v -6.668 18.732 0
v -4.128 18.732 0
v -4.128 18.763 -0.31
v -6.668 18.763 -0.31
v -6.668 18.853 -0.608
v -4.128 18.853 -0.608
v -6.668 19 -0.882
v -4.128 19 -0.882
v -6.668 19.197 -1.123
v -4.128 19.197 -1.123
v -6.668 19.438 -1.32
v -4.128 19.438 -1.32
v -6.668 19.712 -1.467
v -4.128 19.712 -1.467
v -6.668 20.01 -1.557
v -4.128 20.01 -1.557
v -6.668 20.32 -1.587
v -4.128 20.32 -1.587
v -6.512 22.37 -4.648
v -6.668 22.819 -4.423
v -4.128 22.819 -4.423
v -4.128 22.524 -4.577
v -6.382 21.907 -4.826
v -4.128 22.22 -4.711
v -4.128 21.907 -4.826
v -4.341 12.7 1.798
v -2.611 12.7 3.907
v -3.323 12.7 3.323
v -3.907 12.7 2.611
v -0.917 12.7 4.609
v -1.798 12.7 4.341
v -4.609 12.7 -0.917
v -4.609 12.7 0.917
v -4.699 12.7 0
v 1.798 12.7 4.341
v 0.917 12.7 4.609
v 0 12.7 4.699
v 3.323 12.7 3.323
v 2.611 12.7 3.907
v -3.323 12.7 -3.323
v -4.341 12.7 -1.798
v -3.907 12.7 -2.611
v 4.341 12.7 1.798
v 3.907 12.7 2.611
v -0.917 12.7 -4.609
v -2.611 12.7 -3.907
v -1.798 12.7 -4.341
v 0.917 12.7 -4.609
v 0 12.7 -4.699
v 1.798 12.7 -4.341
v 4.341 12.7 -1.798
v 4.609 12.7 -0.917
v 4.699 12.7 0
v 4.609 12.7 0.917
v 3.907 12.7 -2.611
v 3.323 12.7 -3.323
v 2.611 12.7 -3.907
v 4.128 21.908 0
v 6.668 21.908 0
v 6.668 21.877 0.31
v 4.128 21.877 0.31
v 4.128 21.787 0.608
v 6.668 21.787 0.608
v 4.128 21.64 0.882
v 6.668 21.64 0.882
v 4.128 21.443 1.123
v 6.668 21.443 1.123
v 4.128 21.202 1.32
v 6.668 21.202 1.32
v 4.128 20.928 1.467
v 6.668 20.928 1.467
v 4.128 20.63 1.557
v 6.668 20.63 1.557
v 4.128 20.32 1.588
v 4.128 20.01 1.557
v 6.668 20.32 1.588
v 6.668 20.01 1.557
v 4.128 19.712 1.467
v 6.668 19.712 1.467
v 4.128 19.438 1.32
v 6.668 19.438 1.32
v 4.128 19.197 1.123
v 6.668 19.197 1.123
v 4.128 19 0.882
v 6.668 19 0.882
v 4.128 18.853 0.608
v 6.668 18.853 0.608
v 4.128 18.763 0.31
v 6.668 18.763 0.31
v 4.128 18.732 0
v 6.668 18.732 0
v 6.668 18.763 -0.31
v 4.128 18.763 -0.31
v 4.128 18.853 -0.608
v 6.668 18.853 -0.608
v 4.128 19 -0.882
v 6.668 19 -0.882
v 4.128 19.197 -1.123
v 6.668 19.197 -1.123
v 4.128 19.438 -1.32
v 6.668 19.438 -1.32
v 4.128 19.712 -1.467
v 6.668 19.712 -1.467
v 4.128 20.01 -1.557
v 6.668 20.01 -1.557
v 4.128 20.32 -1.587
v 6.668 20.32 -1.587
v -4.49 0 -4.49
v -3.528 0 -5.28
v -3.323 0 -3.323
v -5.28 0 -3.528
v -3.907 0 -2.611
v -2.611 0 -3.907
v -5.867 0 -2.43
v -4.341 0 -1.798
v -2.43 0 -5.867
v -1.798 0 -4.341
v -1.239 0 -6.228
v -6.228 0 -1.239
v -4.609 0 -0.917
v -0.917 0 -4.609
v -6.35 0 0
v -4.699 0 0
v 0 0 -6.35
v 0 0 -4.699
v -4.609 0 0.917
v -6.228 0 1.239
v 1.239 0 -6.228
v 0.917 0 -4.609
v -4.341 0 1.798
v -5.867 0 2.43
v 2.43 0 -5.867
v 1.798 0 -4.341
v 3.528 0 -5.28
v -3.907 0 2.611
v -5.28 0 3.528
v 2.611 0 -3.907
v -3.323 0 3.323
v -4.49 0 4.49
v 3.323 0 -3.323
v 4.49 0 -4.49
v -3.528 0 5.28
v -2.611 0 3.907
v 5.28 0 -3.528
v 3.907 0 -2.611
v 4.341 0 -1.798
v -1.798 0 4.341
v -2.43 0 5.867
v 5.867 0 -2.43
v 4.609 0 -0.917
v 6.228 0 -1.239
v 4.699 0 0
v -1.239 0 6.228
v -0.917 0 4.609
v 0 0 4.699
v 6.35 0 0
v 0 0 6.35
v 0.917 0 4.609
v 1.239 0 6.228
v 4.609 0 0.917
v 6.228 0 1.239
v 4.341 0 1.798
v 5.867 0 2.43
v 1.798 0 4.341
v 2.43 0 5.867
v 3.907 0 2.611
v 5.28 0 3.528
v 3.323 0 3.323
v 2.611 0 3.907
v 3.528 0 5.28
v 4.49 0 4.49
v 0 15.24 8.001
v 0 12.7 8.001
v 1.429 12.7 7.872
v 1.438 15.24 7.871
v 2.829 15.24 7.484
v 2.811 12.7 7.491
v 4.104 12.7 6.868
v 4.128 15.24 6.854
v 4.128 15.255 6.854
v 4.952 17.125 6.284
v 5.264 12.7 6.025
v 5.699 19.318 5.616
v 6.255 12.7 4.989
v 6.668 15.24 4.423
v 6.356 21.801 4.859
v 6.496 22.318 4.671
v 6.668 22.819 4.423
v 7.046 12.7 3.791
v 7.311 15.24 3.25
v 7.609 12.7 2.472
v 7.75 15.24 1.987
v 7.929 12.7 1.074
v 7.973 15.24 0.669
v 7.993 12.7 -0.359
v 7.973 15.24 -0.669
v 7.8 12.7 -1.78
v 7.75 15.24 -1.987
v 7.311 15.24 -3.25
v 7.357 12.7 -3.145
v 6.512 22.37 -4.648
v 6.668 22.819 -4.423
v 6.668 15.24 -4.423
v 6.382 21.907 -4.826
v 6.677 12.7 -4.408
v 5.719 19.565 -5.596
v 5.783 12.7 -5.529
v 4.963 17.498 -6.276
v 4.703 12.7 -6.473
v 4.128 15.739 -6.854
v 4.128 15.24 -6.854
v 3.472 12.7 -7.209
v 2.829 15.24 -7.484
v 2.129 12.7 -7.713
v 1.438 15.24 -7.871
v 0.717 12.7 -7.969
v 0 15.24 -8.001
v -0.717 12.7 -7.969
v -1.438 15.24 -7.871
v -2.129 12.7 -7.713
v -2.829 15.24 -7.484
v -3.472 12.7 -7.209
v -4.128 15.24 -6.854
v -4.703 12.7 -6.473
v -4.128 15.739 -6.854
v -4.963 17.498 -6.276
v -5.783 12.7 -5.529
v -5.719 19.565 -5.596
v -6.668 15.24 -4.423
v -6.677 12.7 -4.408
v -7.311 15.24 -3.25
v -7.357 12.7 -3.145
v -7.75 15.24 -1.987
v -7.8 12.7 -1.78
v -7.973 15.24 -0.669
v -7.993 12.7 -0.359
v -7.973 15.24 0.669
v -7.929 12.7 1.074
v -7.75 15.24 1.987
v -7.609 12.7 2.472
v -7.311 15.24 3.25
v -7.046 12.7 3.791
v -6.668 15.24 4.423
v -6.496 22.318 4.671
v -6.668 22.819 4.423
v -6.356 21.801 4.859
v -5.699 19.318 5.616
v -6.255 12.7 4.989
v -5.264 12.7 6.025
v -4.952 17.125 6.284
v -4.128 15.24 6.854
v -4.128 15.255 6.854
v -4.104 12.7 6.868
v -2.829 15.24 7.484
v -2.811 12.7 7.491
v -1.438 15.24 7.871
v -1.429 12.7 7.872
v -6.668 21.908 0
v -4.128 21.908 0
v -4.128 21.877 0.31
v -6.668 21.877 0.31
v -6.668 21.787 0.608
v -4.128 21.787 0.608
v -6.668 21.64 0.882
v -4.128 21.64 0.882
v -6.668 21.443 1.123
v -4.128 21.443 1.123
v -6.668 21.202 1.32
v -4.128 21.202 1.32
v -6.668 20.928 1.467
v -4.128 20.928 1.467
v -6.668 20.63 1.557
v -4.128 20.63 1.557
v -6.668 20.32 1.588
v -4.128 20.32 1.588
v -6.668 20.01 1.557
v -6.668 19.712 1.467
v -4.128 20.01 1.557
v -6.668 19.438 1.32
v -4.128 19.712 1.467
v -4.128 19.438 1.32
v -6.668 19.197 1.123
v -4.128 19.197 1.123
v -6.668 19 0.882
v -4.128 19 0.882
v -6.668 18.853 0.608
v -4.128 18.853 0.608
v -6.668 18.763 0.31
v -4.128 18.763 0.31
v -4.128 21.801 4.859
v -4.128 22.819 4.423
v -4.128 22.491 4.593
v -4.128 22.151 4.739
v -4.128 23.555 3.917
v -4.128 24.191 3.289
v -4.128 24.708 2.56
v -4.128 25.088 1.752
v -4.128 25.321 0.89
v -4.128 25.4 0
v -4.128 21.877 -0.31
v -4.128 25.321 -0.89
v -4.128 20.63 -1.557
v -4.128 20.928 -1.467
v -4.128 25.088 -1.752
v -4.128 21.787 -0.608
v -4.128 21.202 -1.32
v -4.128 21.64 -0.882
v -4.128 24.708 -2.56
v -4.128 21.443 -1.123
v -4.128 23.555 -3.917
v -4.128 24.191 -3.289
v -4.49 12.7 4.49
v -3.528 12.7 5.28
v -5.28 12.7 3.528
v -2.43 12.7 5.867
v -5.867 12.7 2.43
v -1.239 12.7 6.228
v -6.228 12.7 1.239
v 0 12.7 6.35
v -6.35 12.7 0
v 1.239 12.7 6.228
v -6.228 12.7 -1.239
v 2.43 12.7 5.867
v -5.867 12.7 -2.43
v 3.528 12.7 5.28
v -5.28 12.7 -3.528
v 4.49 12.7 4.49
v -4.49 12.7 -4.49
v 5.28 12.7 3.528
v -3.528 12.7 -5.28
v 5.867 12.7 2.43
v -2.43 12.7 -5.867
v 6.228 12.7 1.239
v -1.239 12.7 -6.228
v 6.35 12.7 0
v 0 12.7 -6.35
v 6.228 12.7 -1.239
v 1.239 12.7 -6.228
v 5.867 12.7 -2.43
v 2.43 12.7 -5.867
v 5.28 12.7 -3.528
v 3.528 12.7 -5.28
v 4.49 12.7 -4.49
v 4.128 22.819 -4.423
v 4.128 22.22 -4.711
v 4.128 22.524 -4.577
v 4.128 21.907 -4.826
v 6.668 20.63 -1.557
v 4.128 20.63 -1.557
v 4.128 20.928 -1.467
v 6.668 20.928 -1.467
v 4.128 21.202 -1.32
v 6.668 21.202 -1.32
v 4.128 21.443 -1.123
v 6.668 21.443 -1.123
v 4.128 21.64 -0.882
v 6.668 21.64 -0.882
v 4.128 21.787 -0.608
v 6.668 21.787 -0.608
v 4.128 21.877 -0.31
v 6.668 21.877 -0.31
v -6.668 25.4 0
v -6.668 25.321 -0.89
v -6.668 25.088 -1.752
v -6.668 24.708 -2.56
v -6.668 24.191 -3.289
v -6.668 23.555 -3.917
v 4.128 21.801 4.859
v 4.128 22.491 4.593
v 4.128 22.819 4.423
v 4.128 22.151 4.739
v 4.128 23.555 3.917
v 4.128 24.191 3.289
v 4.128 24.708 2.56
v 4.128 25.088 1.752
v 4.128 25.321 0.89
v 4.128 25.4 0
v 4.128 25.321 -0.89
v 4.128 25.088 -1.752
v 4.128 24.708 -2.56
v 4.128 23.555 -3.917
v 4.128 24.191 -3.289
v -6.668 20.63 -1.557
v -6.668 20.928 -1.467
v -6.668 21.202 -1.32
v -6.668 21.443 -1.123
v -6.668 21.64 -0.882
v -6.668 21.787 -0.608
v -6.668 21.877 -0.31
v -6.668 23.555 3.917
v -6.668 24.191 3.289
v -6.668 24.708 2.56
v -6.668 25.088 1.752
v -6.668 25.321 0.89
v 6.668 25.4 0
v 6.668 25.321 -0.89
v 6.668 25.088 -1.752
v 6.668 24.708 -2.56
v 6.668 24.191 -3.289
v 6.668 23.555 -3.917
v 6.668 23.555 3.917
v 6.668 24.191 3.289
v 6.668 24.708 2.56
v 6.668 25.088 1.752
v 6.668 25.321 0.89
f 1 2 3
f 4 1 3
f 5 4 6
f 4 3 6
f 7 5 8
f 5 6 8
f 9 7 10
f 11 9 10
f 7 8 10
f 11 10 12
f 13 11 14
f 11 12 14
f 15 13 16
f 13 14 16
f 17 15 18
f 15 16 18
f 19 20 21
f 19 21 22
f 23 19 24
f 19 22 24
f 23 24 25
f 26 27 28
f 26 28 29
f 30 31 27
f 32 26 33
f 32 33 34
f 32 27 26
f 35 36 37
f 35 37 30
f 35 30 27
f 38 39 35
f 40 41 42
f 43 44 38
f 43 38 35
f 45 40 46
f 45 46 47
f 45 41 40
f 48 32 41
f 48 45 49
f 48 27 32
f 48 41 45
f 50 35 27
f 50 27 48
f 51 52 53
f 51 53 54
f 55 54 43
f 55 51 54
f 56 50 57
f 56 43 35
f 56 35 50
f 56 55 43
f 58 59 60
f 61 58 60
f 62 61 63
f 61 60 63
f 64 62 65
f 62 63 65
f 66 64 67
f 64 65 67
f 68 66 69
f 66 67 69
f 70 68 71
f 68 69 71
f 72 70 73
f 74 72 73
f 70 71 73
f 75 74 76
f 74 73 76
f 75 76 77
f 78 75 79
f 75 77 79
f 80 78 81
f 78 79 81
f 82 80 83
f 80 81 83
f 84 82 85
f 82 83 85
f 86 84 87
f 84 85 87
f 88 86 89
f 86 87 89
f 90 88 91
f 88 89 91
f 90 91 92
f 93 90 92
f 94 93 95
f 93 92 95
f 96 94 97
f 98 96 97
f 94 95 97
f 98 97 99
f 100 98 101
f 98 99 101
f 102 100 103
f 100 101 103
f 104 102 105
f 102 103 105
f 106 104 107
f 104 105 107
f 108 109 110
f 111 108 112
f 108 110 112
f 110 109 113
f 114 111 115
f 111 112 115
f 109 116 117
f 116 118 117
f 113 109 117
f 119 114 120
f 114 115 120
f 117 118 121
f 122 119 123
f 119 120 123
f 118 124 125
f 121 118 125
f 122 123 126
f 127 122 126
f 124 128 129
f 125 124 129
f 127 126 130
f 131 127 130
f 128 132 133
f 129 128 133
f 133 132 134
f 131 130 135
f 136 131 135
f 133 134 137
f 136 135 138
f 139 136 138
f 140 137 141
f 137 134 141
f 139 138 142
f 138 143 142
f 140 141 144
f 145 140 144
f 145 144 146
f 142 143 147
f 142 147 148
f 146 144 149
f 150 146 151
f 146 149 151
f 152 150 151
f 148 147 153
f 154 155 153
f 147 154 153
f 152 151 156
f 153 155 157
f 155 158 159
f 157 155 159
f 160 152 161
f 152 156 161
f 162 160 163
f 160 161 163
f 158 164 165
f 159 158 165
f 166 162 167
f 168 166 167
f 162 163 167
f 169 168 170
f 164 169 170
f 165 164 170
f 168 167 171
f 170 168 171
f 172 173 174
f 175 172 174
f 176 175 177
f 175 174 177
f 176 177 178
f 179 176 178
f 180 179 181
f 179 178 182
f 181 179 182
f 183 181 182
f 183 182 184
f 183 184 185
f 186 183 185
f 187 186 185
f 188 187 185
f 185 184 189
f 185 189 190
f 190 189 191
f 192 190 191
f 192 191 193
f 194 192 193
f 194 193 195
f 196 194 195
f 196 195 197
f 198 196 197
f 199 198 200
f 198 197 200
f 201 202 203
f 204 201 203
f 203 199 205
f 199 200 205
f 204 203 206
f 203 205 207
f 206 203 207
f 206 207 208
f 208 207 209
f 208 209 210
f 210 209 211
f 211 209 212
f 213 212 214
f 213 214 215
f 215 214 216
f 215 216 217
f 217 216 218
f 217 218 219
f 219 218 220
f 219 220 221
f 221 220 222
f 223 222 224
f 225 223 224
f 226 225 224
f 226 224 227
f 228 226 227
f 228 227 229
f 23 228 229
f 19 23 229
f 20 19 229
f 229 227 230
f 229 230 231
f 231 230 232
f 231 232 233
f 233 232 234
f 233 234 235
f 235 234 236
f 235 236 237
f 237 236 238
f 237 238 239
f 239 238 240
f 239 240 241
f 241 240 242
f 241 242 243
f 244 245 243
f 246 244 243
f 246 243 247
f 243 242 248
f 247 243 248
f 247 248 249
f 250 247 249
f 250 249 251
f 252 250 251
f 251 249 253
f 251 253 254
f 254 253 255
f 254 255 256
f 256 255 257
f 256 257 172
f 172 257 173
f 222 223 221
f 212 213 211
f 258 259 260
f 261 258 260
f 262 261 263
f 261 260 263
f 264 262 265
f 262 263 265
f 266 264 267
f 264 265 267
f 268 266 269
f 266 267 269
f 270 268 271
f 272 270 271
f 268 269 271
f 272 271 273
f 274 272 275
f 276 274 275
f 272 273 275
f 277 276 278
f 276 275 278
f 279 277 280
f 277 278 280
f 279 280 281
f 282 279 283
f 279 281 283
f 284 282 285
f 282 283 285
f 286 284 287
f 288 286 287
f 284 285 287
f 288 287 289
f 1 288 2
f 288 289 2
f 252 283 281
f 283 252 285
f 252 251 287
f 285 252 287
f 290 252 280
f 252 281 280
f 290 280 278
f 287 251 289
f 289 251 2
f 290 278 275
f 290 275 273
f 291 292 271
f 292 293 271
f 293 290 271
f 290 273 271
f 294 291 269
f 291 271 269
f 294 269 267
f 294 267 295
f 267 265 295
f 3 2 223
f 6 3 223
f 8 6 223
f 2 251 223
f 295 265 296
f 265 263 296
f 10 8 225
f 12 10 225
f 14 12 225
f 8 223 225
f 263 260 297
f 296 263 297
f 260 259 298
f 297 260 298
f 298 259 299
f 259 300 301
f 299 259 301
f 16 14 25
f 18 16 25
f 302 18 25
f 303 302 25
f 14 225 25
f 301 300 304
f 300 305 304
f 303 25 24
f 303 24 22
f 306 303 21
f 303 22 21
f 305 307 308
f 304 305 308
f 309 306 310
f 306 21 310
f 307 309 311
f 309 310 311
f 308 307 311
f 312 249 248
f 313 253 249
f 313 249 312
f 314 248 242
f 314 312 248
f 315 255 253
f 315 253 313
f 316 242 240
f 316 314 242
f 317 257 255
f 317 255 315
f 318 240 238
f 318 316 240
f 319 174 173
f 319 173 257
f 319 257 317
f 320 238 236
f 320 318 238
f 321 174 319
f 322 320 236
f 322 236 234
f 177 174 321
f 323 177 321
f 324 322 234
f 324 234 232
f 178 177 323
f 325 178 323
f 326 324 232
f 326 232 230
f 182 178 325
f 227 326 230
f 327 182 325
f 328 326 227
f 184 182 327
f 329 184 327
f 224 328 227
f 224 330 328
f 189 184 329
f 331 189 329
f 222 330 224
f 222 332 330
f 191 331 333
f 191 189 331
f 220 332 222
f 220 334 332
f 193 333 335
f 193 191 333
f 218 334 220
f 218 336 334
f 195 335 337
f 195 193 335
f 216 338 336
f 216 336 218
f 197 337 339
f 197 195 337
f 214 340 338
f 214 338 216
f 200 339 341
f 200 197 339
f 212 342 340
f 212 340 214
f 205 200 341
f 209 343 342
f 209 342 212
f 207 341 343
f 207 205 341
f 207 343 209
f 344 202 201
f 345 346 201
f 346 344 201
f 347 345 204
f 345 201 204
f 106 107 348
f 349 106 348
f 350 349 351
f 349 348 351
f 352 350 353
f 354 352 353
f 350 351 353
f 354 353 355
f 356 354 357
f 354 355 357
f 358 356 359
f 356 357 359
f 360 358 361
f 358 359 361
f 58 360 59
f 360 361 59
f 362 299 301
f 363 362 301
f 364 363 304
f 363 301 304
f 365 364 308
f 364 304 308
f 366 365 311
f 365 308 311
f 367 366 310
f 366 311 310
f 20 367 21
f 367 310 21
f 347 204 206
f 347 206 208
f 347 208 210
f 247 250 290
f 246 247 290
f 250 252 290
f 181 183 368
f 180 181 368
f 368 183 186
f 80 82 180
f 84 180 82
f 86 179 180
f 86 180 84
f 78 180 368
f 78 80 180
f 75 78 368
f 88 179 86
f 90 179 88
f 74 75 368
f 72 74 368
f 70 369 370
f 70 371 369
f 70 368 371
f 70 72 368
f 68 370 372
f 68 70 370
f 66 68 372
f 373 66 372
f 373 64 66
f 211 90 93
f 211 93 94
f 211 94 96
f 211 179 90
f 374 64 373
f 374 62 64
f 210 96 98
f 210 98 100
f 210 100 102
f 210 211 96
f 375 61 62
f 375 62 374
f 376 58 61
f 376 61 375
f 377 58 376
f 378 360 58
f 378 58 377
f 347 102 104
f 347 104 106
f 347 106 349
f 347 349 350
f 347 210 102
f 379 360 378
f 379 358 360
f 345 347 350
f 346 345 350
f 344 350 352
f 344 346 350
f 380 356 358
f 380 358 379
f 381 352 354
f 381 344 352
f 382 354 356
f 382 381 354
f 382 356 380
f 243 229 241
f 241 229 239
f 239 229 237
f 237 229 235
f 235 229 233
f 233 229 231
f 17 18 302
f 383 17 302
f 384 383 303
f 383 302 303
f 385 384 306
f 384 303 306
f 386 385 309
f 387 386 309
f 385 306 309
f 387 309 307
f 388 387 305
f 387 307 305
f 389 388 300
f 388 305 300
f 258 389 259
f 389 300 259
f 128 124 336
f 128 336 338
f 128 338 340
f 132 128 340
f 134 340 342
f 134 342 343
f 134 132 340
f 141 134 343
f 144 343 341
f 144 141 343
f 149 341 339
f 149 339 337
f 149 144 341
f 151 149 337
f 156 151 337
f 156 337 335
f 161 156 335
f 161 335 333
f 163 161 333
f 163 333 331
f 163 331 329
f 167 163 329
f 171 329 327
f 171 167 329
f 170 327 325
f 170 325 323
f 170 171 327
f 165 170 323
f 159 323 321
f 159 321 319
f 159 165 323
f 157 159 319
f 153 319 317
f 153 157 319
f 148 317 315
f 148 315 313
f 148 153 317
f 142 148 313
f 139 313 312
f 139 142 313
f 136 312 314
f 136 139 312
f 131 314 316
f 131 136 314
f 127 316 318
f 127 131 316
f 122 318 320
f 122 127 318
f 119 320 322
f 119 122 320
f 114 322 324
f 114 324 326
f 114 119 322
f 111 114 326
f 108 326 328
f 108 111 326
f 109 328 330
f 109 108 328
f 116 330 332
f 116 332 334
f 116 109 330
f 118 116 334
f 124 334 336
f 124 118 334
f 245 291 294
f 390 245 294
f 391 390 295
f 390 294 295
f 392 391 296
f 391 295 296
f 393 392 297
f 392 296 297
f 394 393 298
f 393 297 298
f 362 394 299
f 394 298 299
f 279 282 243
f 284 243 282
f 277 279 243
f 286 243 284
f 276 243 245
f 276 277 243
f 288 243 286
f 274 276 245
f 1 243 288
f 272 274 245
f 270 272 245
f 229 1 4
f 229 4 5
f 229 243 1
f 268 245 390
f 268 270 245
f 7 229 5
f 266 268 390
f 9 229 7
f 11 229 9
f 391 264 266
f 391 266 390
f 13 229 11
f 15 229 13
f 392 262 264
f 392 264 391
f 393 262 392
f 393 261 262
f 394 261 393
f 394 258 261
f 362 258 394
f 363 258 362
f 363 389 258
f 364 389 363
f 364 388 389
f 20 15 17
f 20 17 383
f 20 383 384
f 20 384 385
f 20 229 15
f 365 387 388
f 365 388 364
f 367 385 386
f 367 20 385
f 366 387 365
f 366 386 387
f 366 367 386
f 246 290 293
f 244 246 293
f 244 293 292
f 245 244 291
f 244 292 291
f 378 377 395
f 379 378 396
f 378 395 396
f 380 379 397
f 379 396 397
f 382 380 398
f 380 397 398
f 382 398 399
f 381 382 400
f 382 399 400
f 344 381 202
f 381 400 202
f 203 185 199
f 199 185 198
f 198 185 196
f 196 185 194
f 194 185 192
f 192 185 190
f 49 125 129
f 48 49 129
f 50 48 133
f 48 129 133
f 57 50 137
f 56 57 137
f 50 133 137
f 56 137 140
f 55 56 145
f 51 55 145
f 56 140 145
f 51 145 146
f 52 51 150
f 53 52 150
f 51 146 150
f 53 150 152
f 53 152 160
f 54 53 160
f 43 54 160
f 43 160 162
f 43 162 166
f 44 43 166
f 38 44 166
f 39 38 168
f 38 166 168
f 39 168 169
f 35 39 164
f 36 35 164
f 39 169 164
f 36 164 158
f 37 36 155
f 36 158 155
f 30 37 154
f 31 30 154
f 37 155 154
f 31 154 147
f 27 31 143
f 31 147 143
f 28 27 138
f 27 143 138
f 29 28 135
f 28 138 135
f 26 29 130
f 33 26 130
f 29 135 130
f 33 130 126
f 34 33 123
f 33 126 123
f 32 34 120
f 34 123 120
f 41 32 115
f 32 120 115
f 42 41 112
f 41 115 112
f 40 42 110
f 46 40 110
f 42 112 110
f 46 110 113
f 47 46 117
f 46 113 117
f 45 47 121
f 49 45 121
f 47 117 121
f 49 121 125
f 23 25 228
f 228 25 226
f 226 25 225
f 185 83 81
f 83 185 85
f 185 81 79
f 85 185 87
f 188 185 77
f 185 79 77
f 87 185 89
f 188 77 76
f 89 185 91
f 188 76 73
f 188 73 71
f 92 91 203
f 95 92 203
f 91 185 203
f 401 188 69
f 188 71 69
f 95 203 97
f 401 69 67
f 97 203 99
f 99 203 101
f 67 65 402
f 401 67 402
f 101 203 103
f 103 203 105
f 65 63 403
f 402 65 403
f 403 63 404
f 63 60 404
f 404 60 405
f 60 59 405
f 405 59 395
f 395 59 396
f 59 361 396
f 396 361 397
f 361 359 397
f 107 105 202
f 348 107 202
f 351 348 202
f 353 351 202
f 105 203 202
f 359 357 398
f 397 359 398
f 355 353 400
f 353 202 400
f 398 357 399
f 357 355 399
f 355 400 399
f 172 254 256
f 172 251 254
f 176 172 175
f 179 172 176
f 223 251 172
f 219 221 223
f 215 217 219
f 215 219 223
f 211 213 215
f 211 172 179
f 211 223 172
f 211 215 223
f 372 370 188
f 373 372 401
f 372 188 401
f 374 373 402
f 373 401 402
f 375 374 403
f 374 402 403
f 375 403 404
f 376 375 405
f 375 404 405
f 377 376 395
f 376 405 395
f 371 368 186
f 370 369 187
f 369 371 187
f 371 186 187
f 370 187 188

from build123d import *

# Parameters (mm, degrees)
SKETCH1_R               = 8.001
BOSS_EXTRUDE1_DEPTH     = 25.4
SKETCH2_R               = 8.001
SKETCH2_R_2             = 6.35
SKETCH2_R_3             = 4.699
CUT_EXTRUDE1_DEPTH      = 12.7
CUT_EXTRUDE2_DEPTH      = 28.806330251
CUT_EXTRUDE2_DEPTH_BACK = 28.806330251
SKETCH3_W               = 8.255
SKETCH3_H               = 10.16
SKETCH3_W_2             = 1.3335
CUT_EXTRUDE3_DEPTH      = 31.402975072


with BuildPart() as part:
    # Sketch1 → Boss-Extrude1 (new body)
    with BuildSketch(Plane(origin=(0, 0, 0), x_dir=(1, 0, 0), z_dir=(0, 1, 0))):
        with Locations(Location((0, 0, 0), (0, 0, 270))):
            Circle(SKETCH1_R)
    extrude(amount=BOSS_EXTRUDE1_DEPTH)

    # Sketch2 → Cut-Extrude1 (cut)
    # profile 1 of 2: a face of its own
    with BuildSketch(Plane(origin=(0, 0, 0), x_dir=(-1, 0, 0), z_dir=(0, -1, 0))):
        with Locations(Location((0, 0, 0), (0, 0, 90))):
            Circle(SKETCH2_R)
        with Locations(Location((0, 0, 0), (0, 0, 90))):
            Circle(SKETCH2_R_2, mode=Mode.SUBTRACT)
    # profile 2 of 2: a face of its own
    with BuildSketch(Plane(origin=(0, 0, 0), x_dir=(-1, 0, 0), z_dir=(0, -1, 0))):
        with Locations(Location((0, 0, 0), (0, 0, 90))):
            Circle(SKETCH2_R_3)
    extrude(amount=-CUT_EXTRUDE1_DEPTH, mode=Mode.SUBTRACT)

    # Sketch3 → Cut-Extrude2 (cut, two sides: drawn at the far end of the back side and taken through both)
    with BuildSketch(Plane.XY.offset(-CUT_EXTRUDE2_DEPTH_BACK)):
        with Locations((0, 20.32)):
            Rectangle(SKETCH3_W, SKETCH3_H)
        with Locations((-7.33425, 20.32)):
            Rectangle(SKETCH3_W_2, SKETCH3_H)
        with Locations((7.33425, 20.32)):
            Rectangle(SKETCH3_W_2, SKETCH3_H)
    extrude(amount=CUT_EXTRUDE2_DEPTH + CUT_EXTRUDE2_DEPTH_BACK, mode=Mode.SUBTRACT)

    # Sketch4 → Cut-Extrude3 (cut, through all)
    with BuildSketch(Plane(origin=(6.6675, 0, 0), x_dir=(0, 0, -1), z_dir=(1, 0, 0))):
        with BuildLine():
            Line((-4.422719158, 25.4), (0, 25.4))
            Line((0, 25.4), (4.422719158, 25.4))
            Line((4.422719158, 25.4), (4.422719158, 22.819190919))
            ThreePointArc((4.422719158, 22.819190919), (4.646674927, 22.373000761), (4.825752455, 21.906982432))
            Line((4.825752455, 21.906982432), (7.018236237, 15.24))
            Line((7.018236237, 15.24), (6.955993892, 50.8))
            Line((6.955993892, 50.8), (-6.858660717, 50.8))
            Line((-6.858660717, 50.8), (-6.858660717, 15.24))
            Line((-6.858660717, 15.24), (-4.859385257, 21.800802121))
            ThreePointArc((-4.859385257, 21.800802121), (-4.668901855, 22.321937928), (-4.422719158, 22.819190919))
            Line((-4.422719158, 22.819190919), (-4.422719158, 25.4))
        make_face()
        with BuildLine():
            ThreePointArc((1.5875, 20.32), (1.122532015, 21.442532015), (0, 21.9075))
            Line((0, 21.9075), (0, 18.7325))
            ThreePointArc((0, 18.7325), (1.122532015, 19.197467985), (1.5875, 20.32))
        make_face()
        with BuildLine():
            Line((0, 18.7325), (0, 21.9075))
            ThreePointArc((0, 21.9075), (-1.5875, 20.32), (0, 18.7325))
        make_face()
        with BuildLine():
            ThreePointArc((-4.422719158, 22.819190919), (-2.560323235, 24.707612669), (0, 25.4))
            Line((0, 25.4), (-4.422719158, 25.4))
            Line((-4.422719158, 25.4), (-4.422719158, 22.819190919))
        make_face()
        with BuildLine():
            Line((4.422719158, 25.4), (0, 25.4))
            ThreePointArc((0, 25.4), (2.560323235, 24.707612669), (4.422719158, 22.819190919))
            Line((4.422719158, 22.819190919), (4.422719158, 25.4))
        make_face()
    extrude(amount=-CUT_EXTRUDE3_DEPTH, mode=Mode.SUBTRACT)


solid = part.part
